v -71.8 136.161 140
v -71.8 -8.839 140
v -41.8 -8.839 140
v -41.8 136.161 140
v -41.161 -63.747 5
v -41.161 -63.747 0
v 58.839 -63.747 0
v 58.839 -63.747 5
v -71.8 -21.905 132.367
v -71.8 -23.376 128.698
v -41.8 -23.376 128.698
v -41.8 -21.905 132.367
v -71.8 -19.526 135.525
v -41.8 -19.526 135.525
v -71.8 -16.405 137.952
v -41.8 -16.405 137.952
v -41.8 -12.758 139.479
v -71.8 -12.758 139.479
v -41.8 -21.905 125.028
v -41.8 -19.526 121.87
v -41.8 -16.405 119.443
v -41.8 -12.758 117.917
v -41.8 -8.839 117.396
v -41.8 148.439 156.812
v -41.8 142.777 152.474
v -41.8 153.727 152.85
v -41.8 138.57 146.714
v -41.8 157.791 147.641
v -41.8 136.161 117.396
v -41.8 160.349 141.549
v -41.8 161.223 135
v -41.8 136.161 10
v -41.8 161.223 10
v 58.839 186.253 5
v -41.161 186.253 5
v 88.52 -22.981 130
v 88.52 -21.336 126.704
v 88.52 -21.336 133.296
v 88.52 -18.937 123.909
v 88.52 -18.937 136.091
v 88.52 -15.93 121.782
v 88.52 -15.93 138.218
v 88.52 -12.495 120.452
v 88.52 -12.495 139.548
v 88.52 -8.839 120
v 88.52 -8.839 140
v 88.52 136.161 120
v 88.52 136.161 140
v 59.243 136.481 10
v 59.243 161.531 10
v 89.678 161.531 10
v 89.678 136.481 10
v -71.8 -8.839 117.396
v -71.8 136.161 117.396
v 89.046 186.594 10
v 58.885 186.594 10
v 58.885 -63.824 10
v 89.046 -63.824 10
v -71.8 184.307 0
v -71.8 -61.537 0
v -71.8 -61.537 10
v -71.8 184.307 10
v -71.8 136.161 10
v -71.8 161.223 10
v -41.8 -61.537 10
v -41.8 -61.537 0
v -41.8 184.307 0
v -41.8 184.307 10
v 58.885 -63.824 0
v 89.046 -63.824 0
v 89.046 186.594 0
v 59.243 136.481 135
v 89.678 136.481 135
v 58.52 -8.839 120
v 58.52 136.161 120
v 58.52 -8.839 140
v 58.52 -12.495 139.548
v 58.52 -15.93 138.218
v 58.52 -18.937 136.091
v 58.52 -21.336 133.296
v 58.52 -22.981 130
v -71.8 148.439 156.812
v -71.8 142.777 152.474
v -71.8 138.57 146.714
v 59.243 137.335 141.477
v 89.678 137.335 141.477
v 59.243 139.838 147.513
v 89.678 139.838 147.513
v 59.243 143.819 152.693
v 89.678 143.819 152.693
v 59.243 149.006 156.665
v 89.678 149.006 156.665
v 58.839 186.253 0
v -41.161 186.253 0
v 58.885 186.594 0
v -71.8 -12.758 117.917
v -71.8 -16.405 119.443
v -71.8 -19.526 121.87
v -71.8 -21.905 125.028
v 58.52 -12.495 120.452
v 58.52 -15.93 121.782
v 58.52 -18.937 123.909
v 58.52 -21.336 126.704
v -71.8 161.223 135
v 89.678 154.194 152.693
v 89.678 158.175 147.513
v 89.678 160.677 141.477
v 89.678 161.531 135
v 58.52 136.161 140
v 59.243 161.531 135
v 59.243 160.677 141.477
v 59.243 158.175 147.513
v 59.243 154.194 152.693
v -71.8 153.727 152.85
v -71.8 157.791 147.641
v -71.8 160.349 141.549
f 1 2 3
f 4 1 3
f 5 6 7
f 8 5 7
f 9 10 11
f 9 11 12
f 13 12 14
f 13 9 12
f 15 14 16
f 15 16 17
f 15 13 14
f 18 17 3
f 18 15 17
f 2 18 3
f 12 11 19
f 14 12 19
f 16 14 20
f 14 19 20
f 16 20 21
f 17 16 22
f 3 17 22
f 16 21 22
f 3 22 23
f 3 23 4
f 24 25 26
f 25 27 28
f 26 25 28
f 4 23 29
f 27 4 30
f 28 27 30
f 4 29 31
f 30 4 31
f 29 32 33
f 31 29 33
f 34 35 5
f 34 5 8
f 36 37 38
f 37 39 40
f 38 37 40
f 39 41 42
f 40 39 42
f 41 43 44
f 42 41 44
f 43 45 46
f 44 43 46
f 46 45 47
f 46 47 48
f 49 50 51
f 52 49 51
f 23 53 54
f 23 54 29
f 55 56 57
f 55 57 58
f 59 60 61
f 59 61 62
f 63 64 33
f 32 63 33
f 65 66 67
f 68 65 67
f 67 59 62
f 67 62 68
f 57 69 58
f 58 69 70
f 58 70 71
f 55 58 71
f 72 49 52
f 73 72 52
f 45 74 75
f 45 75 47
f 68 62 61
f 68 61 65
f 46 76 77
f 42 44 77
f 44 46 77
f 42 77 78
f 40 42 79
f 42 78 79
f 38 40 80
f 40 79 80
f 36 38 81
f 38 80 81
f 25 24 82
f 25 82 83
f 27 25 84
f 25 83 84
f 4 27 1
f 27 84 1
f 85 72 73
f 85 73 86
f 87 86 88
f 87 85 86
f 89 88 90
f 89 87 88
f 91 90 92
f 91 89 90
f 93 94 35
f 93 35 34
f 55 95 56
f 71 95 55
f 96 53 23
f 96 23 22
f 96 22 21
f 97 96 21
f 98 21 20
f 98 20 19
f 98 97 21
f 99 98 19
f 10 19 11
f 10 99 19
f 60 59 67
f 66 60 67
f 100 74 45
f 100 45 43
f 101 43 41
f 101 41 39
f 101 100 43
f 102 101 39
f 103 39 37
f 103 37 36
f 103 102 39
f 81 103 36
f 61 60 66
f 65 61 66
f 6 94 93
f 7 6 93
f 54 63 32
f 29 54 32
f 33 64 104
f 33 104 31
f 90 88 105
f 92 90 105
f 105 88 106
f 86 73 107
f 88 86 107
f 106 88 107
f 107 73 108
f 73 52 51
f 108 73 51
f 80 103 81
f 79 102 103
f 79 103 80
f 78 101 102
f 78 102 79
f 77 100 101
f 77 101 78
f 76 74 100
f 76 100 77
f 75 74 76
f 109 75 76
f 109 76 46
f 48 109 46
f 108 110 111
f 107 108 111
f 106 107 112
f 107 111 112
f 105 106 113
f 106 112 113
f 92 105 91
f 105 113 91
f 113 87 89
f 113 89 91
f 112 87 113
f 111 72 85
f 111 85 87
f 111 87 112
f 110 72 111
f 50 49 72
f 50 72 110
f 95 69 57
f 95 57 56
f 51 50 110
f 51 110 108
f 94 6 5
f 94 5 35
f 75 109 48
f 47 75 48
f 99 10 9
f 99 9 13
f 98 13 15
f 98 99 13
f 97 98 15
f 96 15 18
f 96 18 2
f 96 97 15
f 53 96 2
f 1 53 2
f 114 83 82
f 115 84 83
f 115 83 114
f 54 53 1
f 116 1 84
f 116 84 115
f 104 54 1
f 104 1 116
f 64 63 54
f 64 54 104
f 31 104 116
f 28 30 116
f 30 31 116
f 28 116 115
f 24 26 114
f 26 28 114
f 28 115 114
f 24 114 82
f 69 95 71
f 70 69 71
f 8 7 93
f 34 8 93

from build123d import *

# Parameters (mm, degrees)
F0_W          = 100
F0_H          = 250
F1_DEPTH      = 5
F2_W          = 30
F2_H          = 245.8441516644
F3_DEPTH      = 10
F2_W_2        = 30.1613137126
F2_H_2        = 250.4182979465
F4_W          = 30
F4_H          = 25.0615030527
F5_DEPTH      = 150
F4_W_2        = 30.434358865
F4_H_2        = 25.0502228737
F6_W          = 30
F6_H          = 22.6044723392
F7_DEPTH      = 160
F6_H_2        = 20
F8_T1_DEPTH   = 152.4744871392
F8_T3_DEPTH   = 155
F8_2_T1_DEPTH = 155.434358865
F9_T1_DEPTH   = 105
F9_2_T1_DEPTH = 105


# Not quite as in the source:
# - a fillet or chamfer that OpenCascade refuses, or shapes differently, is made with other operations: its cross-section is extruded or revolved along the edge and cut away or added


with BuildPart() as f1:
    # F0 (on Top) → F1 (new body)
    with BuildSketch(Plane.XY):
        with Locations((8.8387416875, 61.2532682717)):
            Rectangle(F0_W, F0_H)
    extrude(amount=F1_DEPTH)


with BuildPart() as f3:
    # F2 (on Top) → F3 (new body)
    with BuildSketch(Plane.XY):
        with Locations((-56.7995943129, 61.3852031529)):
            Rectangle(F2_W, F2_H)
    extrude(amount=F3_DEPTH)


with BuildPart() as f3b:
    # F2 (on Top) → F3, piece 2 (new body)
    with BuildSketch(Plane.XY):
        with Locations((73.9655904472, 61.3852031529)):
            Rectangle(F2_W_2, F2_H_2)
    extrude(amount=F3_DEPTH)


with BuildPart() as f5:
    # F4 (on face) → F5 (new body)
    with BuildSketch(Plane.XY.offset(10)):
        with Locations((-56.7995943129, 148.6918106675)):
            Rectangle(F4_W, F4_H)
    extrude(amount=F5_DEPTH)

    # F6 (on face) → F7 (join)
    with BuildSketch(Plane.XZ.offset(-136.1610591412)):
        with Locations((-56.7995943129, 128.6977638304)):
            Rectangle(F6_W, F6_H)
    extrude(amount=F7_DEPTH)

    # F8: fillet of radius 25 on 2 edges, made by hand

    # F8_s2 → F8_t1 (cut)
    with BuildSketch(Plane.YZ.offset(-133.0368378825)):
        with BuildLine():
            ThreePointArc((160.655956569, 160), (144.8445682681, 154.364916731), (136.1610591412, 140))
            Line((136.1610591412, 140), (136.1610591412, 160))
            Line((136.1610591412, 160), (160.655956569, 160))
        make_face()
    extrude(amount=F8_T1_DEPTH, mode=Mode.SUBTRACT)

    # F8_s4 → F8_t3 (cut)
    with BuildSketch(Plane.YZ.offset(-134.2995943129)):
        with BuildLine():
            ThreePointArc((161.2225621939, 135), (153.9002317235, 152.6776695297), (136.2225621939, 160))
            Line((136.2225621939, 160), (161.2225621939, 160))
            Line((161.2225621939, 160), (161.2225621939, 135))
        make_face()
    extrude(amount=F8_T3_DEPTH, mode=Mode.SUBTRACT)

    # F9: fillet of radius 15 on 2 edges, made by hand

    # F9_s2 → F9_t1 (cut)
    with BuildSketch(Plane.YZ.offset(-109.2995943129)):
        with BuildLine():
            ThreePointArc((-23.8389408588, 125), (-19.4455425766, 135.6066017178), (-8.8389408588, 140))
            Line((-8.8389408588, 140), (-23.8389408588, 140))
            Line((-23.8389408588, 140), (-23.8389408588, 125))
        make_face()
        with BuildLine():
            ThreePointArc((-8.8389408588, 117.3955276608), (-19.4455425766, 121.788925943), (-23.8389408588, 132.3955276608))
            Line((-23.8389408588, 132.3955276608), (-23.8389408588, 117.3955276608))
            Line((-23.8389408588, 117.3955276608), (-8.8389408588, 117.3955276608))
        make_face()
    extrude(amount=F9_T1_DEPTH, mode=Mode.SUBTRACT)


with BuildPart() as f5b:
    # F4 (on face) → F5, piece 2 (new body)
    with BuildSketch(Plane.XY.offset(10)):
        with Locations((74.460586533, 149.00611341)):
            Rectangle(F4_W_2, F4_H_2)
    extrude(amount=F5_DEPTH)

    # F8#2: fillet of radius 25 on 2 edges, made by hand

    # F8_2_s2 → F8_2_t1 (cut)
    with BuildSketch(Plane.YZ.offset(-3.2565928996)):
        with BuildLine():
            ThreePointArc((136.4810019732, 135), (143.8033324435, 152.6776695297), (161.4810019732, 160))
            Line((161.4810019732, 160), (136.4810019732, 160))
            Line((136.4810019732, 160), (136.4810019732, 135))
        make_face()
        with BuildLine():
            ThreePointArc((161.5312248468, 135), (154.2088943765, 152.6776695297), (136.5312248468, 160))
            Line((136.5312248468, 160), (161.5312248468, 160))
            Line((161.5312248468, 160), (161.5312248468, 135))
        make_face()
    extrude(amount=F8_2_T1_DEPTH, mode=Mode.SUBTRACT)


with BuildPart() as f7:
    # F6 (on face) → F7, piece 2 (new body)
    with BuildSketch(Plane.XZ.offset(-136.1610591412)):
        with Locations((73.5199929774, 130)):
            Rectangle(F6_W, F6_H_2)
    extrude(amount=F7_DEPTH)

    # F9#2: fillet of radius 15 on 2 edges, made by hand

    # F9_2_s2 → F9_2_t1 (cut)
    with BuildSketch(Plane.YZ.offset(21.0199929774)):
        with BuildLine():
            ThreePointArc((-8.8389408588, 140), (-19.4455425766, 135.6066017178), (-23.8389408588, 125))
            Line((-23.8389408588, 125), (-23.8389408588, 140))
            Line((-23.8389408588, 140), (-8.8389408588, 140))
        make_face()
        with BuildLine():
            ThreePointArc((-8.8389408588, 120), (-19.4455425766, 124.3933982822), (-23.8389408588, 135))
            Line((-23.8389408588, 135), (-23.8389408588, 120))
            Line((-23.8389408588, 120), (-8.8389408588, 120))
        make_face()
    extrude(amount=F9_2_T1_DEPTH, mode=Mode.SUBTRACT)


solid = Compound([f1.part, f3.part, f3b.part, f5.part, f5b.part, f7.part])
